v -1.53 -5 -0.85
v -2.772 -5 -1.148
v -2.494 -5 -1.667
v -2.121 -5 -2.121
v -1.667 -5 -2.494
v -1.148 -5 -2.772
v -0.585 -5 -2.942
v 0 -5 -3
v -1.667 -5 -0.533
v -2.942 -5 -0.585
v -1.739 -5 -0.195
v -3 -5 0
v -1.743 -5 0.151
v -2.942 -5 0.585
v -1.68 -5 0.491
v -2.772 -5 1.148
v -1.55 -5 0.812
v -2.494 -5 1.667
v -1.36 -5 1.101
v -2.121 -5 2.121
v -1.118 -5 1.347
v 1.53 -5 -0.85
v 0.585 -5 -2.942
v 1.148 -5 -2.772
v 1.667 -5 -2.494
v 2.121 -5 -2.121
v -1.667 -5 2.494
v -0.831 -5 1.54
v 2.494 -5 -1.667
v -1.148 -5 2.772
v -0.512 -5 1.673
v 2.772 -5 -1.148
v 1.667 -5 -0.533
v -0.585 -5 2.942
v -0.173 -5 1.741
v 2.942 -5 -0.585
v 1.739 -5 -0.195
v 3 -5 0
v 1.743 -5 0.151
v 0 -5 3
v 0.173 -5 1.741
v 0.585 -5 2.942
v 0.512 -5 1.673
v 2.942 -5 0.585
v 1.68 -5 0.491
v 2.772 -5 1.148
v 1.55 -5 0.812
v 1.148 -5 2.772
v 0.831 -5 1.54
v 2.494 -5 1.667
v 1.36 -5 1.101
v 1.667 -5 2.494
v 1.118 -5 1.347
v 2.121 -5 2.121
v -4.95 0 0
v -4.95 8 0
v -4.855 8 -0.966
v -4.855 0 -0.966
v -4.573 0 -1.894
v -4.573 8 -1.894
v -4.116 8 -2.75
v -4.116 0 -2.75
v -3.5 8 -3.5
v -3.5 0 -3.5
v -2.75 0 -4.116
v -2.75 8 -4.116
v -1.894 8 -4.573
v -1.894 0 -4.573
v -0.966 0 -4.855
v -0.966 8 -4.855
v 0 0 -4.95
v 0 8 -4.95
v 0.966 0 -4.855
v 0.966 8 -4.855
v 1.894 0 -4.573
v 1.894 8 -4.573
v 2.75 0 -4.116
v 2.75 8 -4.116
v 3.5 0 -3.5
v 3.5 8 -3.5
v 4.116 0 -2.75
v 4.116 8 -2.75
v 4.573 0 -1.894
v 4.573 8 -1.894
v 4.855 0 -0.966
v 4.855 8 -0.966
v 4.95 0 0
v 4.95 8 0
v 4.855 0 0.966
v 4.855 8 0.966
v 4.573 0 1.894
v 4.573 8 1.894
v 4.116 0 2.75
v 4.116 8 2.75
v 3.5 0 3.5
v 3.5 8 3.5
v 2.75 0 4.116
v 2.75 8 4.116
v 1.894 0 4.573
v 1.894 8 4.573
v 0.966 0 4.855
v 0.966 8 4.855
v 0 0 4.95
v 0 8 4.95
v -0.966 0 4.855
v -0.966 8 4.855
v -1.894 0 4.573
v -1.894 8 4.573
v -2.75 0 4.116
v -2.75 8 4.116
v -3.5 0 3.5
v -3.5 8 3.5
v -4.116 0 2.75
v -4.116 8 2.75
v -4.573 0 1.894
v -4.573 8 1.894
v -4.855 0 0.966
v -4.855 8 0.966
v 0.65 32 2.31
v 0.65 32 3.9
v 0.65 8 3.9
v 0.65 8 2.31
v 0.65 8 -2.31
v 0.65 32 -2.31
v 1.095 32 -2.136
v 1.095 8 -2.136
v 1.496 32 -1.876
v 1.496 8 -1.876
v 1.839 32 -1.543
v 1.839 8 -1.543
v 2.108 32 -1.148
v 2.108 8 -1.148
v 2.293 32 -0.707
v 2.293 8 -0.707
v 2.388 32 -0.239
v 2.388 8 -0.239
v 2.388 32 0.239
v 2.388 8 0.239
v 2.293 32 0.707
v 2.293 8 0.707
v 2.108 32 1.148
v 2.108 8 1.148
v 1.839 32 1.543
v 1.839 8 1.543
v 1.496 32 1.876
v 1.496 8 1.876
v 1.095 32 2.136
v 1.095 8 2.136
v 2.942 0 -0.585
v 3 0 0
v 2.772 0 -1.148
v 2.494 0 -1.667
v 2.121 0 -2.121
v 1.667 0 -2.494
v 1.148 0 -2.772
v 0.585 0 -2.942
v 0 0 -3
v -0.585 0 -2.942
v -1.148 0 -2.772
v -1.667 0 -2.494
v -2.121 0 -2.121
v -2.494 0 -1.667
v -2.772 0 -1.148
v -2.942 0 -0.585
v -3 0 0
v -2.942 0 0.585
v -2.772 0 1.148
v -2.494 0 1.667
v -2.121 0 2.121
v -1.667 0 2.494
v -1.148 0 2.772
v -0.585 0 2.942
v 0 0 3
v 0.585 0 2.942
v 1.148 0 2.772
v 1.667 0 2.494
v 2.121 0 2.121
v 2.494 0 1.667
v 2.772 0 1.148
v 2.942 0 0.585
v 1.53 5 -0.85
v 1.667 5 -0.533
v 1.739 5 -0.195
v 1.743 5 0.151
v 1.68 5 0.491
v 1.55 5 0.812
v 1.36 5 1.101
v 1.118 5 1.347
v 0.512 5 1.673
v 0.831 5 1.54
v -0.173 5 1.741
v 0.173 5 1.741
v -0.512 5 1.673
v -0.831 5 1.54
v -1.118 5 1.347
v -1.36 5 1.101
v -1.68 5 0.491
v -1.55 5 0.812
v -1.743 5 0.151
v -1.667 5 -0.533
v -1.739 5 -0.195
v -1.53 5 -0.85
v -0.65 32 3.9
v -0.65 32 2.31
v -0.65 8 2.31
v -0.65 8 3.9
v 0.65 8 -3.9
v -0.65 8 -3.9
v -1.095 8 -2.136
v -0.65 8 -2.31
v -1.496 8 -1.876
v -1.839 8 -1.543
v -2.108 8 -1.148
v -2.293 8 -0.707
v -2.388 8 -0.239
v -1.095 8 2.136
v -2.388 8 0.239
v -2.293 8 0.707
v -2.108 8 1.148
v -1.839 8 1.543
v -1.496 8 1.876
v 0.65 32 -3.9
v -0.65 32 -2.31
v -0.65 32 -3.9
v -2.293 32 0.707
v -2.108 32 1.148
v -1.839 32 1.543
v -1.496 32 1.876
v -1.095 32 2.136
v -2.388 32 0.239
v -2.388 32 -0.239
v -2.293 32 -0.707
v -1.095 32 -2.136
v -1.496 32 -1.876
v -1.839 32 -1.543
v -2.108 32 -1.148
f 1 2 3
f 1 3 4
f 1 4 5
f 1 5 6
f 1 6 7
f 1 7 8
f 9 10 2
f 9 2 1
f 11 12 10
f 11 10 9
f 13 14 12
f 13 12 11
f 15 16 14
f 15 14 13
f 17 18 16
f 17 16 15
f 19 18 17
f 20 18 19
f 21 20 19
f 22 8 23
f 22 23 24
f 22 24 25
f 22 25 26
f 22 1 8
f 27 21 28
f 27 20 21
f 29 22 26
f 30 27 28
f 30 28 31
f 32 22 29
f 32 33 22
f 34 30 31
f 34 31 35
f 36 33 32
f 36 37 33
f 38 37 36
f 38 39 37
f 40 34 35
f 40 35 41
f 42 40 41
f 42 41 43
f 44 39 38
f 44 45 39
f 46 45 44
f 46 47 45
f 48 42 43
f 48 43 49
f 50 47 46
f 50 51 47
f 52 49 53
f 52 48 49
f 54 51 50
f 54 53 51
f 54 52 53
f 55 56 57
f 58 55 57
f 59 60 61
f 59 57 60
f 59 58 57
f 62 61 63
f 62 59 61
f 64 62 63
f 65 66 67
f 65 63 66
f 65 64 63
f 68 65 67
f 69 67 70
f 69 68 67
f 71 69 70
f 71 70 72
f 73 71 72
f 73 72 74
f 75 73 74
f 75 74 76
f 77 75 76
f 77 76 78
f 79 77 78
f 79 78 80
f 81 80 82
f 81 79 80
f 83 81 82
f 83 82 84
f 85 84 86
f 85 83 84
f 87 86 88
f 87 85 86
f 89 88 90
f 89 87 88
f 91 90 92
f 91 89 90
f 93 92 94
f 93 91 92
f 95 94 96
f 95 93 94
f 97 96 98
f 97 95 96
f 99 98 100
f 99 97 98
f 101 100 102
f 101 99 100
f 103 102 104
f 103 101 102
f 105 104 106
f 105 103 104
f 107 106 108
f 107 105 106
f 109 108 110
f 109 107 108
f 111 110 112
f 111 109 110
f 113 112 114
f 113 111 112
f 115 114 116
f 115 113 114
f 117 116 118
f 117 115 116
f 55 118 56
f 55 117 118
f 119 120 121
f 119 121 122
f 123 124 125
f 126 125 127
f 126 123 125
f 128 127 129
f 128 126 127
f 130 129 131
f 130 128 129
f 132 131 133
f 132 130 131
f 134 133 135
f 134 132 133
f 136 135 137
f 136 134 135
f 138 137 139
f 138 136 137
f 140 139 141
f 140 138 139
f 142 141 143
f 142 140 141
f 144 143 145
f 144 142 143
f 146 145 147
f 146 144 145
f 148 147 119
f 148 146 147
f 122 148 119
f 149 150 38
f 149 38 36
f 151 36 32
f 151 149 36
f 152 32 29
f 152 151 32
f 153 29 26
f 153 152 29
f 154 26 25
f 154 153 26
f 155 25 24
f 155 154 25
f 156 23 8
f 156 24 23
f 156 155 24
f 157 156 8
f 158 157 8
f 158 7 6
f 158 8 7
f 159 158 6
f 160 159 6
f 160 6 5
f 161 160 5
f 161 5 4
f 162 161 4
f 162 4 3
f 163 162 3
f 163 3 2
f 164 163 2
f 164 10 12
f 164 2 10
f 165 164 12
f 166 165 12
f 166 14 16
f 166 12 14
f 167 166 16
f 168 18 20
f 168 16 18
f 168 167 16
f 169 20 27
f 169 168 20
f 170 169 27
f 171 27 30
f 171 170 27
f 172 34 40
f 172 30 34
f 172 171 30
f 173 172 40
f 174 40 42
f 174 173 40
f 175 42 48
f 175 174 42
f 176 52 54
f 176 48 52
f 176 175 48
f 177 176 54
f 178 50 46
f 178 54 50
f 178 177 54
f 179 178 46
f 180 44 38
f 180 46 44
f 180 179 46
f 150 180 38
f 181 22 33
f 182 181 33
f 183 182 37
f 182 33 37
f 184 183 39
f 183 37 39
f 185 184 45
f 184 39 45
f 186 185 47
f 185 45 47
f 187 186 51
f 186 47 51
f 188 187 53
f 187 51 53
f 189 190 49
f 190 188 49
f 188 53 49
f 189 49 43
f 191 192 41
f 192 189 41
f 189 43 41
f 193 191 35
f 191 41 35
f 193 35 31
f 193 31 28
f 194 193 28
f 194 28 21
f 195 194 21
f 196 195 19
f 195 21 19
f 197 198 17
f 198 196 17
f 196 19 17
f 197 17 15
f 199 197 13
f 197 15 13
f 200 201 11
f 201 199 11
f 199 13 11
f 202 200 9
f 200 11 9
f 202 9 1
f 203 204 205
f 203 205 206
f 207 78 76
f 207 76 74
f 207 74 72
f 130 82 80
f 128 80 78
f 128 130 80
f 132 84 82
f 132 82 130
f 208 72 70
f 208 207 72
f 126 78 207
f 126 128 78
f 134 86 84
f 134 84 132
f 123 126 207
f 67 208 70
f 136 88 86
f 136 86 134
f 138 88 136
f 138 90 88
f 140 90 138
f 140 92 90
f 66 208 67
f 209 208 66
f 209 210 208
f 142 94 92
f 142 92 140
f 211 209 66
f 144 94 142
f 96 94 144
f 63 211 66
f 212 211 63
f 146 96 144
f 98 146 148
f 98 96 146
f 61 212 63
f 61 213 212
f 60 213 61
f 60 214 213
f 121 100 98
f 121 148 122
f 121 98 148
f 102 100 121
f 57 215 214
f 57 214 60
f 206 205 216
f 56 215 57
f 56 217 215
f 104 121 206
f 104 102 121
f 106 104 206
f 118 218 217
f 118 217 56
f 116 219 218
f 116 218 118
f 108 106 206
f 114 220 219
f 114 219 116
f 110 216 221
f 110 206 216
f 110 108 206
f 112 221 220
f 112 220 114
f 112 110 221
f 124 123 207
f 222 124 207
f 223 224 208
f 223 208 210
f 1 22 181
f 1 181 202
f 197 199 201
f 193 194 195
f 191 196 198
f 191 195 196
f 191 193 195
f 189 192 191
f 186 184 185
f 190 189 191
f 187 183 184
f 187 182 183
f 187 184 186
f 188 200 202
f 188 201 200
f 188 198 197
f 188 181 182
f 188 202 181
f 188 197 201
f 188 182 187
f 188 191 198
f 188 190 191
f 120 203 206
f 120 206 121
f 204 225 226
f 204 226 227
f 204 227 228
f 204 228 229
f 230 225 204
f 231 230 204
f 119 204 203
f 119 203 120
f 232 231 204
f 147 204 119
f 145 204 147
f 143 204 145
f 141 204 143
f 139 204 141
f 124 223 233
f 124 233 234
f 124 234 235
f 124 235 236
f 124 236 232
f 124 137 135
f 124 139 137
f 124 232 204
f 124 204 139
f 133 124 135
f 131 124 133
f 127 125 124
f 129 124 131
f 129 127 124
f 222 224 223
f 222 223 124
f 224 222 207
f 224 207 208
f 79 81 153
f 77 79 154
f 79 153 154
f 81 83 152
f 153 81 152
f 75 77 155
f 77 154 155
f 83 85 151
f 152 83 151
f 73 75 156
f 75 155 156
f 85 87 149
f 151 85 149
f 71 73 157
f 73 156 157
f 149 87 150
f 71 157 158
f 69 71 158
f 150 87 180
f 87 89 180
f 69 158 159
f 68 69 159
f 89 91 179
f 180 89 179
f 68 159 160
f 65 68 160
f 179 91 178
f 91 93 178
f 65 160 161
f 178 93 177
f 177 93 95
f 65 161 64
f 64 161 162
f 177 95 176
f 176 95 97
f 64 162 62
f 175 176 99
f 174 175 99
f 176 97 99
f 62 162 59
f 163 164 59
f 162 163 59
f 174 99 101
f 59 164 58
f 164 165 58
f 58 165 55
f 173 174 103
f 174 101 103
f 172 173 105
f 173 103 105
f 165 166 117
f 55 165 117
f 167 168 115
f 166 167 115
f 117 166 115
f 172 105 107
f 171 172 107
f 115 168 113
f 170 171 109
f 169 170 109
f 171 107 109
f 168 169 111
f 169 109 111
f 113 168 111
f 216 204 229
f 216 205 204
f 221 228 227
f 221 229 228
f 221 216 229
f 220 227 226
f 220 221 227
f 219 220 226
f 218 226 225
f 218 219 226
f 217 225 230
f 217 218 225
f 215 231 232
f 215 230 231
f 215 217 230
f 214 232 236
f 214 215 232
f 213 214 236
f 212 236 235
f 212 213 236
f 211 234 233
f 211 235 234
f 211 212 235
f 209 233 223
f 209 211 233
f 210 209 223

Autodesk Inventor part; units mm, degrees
ref_plane "YZ Plane" through (0, 0, 0) normal (1, 0, 0) x (0, 1, 0)
ref_plane "XZ Plane" through (0, 0, 0) normal (0, 1, 0) x (-1, 0, 0)
ref_plane "XY Plane" through (0, 0, 0) normal (0, 0, 1) x (1, 0, 0)
sketch "Sketch1" plane through (0, 0, 0) normal (0, 1, 0) x (-1, 0, 0)
  circle A0 centre (0, 0) radius 4.95
  dimension "d0" = 9.9
extrude "Extrusion1" add sketch "Sketch1" along normal blind 8
sketch "Sketch2" plane through (0, 8, 0) normal (0, 1, 0) x (1, 0, 0)
  circle A0 centre (0, 0) radius 2.4
  line L0 (-0.65, -3.9) -> (0.65, -3.9)
  line L1 (0.65, -3.9) -> (0.65, 3.9)
  line L2 (0.65, 3.9) -> (-0.65, 3.9)
  line L3 (-0.65, 3.9) -> (-0.65, -3.9)
  line L4 (-0.65, -3.9) -> (0.65, 3.9) construction
  line L5 (0.65, -3.9) -> (-0.65, 3.9) construction
  point P0 (-0.65, 2.3103)
  point P1 (-0.65, -2.3103)
  point P2 (0.65, -2.3103)
  point P3 (0.65, 2.3103)
  dimension "d3" = 4.8
  dimension "d4" = 1.3
  dimension "d5" = 7.8
extrude "Extrusion2" add sketch "Sketch2" along normal blind 24
sketch "Sketch3" plane through (0, 0, 0) normal (0, -1, 0) x (1, 0, 0)
  circle A0 centre (0, 0) radius 3
  dimension "d8" = 6
extrude "Extrusion3" add sketch "Sketch3" along normal blind 5
sketch "Sketch4" plane through (0, -5, 0) normal (0, -1, 0) x (1, 0, 0)
  arc A0 (-0.65, 2.3103) -> (-0.65, -2.3103) centre (0, 0) ccw projected
  circle A1 centre (0, 0) radius 1.75
  line L0 (1.3857, -0.85) -> (-1.5, -0.85)
  line L1 (1.3857, -0.85) -> (1.8275, -0.85)
  line L2 (-1.5, -0.85) -> (-1.5752, -0.85)
  point P0 (-0.5831, -1.65)
  point P1 (0.5831, -1.65)
  point P2 (1.5297, -0.85)
  point P3 (-1.5297, -0.85)
  dimension "d11" = 3.5
  dimension "d12" = 2.6
extrude "Extrusion6" cut sketch "Sketch4" against normal blind 10 contours A1 L1 L0 L2 picked at (-0.5593, -0.3047)
properties part number "spojkaMotoruSRotorem"
